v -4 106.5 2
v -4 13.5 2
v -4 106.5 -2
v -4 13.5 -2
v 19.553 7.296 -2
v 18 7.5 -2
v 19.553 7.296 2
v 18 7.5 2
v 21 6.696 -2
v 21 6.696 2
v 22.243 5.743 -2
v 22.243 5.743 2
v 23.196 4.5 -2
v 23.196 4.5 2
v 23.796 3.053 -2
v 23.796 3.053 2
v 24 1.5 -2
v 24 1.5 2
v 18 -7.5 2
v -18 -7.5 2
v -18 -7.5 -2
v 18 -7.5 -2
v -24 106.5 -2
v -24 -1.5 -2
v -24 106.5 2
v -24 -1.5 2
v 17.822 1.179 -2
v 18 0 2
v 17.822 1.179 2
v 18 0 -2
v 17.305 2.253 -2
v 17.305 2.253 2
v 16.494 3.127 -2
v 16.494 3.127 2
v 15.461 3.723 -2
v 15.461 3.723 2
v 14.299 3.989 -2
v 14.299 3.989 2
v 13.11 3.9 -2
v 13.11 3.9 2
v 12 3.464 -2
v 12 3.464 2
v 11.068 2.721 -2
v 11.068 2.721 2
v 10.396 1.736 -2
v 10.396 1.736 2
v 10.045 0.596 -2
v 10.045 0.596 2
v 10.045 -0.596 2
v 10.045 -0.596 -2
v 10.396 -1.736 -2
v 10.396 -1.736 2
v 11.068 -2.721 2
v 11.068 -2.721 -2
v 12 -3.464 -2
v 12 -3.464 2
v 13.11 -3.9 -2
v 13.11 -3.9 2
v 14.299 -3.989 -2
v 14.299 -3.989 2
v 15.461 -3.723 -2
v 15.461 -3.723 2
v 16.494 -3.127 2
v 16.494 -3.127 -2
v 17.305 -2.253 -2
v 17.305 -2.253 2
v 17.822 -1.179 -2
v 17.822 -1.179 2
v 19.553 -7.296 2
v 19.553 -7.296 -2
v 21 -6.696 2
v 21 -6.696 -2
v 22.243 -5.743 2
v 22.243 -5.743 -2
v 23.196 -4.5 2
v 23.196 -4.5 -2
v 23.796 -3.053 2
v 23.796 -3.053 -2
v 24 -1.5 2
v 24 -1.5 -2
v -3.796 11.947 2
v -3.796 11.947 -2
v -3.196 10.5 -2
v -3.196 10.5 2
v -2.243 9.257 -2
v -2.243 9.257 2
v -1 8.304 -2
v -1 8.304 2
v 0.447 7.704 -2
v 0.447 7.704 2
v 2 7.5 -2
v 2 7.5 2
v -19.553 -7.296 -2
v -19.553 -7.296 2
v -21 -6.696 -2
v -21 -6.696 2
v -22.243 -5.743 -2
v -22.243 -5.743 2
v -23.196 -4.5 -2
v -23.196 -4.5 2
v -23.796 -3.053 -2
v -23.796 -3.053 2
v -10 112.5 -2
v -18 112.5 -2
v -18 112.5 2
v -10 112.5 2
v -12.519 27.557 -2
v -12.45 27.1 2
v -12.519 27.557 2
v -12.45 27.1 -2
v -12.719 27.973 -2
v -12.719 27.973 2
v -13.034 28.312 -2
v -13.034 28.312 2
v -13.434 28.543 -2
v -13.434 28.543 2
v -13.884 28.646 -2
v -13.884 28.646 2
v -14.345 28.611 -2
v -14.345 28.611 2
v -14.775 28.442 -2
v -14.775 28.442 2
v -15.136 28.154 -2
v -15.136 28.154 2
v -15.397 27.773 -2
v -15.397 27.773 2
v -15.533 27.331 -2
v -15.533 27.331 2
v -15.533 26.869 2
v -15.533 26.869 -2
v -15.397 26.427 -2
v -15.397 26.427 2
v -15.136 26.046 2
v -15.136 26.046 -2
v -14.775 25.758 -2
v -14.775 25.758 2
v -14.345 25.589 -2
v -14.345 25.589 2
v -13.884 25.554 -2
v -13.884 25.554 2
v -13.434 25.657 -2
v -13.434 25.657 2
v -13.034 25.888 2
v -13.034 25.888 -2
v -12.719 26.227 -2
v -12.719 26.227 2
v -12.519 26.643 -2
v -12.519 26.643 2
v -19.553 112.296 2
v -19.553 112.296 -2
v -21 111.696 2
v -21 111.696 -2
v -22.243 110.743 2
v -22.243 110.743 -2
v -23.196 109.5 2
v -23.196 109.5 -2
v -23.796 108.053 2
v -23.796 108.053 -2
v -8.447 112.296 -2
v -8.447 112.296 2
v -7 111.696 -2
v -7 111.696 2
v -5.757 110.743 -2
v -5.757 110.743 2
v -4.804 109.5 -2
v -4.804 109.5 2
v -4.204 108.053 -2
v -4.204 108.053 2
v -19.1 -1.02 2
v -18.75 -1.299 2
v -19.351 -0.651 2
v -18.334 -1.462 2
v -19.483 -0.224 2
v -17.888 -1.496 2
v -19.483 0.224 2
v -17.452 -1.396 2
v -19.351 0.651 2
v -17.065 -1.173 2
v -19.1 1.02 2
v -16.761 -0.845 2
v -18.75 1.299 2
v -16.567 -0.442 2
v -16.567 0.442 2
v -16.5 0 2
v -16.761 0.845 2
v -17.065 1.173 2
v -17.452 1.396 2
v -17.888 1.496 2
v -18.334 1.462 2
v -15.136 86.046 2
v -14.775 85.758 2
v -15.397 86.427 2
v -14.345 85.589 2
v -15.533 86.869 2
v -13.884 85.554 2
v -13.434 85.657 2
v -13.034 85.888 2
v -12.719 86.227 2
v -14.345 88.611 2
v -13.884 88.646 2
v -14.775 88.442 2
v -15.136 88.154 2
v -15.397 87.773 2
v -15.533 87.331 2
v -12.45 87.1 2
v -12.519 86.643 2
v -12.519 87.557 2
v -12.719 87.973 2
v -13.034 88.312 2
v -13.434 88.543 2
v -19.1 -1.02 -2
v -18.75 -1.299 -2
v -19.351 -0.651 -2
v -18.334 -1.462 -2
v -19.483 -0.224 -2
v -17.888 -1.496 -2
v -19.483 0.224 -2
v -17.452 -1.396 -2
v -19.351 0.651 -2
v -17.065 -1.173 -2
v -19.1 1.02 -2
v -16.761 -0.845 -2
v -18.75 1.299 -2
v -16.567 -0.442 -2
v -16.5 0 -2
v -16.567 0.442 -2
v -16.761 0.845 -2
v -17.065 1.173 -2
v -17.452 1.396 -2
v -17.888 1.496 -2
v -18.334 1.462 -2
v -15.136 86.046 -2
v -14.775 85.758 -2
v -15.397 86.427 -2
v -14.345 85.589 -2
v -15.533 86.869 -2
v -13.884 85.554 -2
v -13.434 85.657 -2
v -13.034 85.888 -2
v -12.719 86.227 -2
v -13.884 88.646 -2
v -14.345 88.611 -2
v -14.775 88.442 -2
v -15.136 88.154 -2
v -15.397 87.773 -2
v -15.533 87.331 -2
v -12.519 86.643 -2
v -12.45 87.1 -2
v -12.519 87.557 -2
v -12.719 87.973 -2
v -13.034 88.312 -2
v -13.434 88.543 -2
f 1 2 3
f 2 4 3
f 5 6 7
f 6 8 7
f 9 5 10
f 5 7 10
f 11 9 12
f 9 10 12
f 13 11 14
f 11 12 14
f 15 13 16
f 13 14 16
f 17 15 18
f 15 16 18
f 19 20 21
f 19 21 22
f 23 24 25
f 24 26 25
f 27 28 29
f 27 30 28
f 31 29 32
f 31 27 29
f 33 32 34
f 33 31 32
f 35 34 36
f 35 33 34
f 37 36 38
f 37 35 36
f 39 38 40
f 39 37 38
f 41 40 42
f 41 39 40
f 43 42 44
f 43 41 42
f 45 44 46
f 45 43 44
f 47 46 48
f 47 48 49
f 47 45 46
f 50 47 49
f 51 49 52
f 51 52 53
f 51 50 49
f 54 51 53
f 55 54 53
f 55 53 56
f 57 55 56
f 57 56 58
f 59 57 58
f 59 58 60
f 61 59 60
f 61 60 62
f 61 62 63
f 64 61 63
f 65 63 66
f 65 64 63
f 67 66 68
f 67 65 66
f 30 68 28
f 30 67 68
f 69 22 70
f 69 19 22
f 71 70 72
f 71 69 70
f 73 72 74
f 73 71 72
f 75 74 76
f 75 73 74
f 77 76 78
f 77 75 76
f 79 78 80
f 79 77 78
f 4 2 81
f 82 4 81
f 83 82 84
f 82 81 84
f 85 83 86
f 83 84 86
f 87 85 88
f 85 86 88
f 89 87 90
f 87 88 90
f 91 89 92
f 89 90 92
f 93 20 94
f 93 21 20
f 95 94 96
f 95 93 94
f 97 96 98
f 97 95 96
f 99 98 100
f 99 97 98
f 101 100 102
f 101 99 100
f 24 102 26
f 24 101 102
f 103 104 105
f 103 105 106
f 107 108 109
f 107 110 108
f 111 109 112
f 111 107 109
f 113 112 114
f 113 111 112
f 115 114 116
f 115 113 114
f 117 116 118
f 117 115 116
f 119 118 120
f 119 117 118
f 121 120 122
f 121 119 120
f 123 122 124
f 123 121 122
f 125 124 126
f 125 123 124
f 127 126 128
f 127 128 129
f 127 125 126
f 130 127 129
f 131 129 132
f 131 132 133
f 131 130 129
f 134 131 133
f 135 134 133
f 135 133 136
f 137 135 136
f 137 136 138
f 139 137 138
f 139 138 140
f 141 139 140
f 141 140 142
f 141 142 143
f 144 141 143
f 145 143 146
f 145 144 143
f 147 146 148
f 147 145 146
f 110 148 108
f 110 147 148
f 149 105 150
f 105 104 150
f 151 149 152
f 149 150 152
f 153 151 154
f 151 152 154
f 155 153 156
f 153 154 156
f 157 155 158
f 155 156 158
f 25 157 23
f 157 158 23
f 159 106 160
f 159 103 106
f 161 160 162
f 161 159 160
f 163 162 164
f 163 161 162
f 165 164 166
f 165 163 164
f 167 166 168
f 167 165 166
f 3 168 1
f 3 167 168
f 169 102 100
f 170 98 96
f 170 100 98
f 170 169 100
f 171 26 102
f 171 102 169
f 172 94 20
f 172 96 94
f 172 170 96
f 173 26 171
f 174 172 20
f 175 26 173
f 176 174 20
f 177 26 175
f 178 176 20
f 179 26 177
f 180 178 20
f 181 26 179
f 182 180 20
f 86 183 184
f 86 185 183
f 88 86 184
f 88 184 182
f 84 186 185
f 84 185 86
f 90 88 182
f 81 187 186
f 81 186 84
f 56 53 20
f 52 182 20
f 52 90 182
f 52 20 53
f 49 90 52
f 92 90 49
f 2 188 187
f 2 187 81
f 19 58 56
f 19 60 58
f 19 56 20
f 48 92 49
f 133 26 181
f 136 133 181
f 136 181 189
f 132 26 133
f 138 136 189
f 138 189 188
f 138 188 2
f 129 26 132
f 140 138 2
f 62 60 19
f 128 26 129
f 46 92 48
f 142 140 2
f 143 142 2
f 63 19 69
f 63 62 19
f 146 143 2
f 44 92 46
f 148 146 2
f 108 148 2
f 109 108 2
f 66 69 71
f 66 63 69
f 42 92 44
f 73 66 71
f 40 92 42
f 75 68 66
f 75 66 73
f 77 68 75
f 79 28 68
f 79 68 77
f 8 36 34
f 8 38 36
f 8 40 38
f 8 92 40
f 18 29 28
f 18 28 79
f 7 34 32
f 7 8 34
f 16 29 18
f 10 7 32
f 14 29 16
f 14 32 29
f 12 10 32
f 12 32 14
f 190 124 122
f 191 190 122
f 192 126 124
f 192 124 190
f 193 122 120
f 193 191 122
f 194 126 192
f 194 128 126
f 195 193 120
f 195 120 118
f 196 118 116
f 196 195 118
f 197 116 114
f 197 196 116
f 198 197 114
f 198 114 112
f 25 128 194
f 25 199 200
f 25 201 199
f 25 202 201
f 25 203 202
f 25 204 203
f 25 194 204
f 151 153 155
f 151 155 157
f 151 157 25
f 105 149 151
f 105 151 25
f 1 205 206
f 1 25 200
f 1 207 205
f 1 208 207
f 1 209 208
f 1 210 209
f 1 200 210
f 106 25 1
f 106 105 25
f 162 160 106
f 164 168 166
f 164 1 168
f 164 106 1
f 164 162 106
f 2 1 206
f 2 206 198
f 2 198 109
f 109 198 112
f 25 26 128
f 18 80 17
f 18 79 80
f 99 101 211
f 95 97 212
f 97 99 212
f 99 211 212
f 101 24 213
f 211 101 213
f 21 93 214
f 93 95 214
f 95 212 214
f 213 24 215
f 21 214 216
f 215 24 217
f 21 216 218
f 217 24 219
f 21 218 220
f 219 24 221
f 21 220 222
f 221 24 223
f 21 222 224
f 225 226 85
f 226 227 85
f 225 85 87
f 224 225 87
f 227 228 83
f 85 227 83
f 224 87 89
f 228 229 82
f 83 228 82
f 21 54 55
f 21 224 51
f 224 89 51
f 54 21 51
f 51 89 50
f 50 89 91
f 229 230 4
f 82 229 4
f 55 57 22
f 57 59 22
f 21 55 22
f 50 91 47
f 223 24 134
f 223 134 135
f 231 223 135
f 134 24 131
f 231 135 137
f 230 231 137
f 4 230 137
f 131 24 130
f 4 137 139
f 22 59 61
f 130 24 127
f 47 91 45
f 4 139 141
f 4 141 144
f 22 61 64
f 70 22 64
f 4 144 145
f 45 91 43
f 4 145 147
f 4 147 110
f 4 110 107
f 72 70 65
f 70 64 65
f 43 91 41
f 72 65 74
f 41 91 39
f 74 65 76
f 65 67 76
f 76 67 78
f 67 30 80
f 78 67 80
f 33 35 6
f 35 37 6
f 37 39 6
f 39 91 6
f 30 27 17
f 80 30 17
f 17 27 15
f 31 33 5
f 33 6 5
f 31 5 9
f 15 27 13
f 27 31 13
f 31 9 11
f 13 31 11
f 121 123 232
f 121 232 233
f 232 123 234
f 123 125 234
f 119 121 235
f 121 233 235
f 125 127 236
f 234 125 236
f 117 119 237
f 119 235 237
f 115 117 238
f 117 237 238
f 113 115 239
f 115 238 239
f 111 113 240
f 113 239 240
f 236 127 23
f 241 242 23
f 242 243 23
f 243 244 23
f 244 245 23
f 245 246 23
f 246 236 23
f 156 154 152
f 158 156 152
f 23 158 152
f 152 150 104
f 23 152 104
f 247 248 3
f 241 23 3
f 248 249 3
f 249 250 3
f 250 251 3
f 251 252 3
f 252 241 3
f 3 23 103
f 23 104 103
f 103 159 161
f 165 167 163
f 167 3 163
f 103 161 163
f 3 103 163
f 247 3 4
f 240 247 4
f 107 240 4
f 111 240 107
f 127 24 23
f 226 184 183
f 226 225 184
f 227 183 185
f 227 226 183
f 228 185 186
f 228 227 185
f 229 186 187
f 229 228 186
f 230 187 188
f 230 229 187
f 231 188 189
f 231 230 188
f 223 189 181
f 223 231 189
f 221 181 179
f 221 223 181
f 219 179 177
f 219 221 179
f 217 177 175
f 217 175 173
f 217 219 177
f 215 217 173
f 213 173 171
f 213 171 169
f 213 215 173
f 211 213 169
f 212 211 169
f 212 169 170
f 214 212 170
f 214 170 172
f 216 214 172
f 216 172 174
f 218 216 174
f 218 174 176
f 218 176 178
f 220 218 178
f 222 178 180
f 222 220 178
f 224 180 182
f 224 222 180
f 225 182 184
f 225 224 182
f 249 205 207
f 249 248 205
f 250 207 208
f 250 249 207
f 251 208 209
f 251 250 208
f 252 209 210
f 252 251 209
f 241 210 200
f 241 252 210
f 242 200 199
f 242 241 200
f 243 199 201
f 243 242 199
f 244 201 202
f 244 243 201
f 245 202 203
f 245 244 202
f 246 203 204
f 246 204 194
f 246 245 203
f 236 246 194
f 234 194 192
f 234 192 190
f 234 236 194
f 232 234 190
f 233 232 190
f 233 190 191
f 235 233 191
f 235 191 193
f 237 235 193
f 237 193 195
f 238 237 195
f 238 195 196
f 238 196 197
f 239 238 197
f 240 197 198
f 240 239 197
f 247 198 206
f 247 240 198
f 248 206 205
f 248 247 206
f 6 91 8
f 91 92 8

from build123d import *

# Parameters (mm, degrees)
SKETCH1_W           = 20
SKETCH1_H           = 105
SKETCH1_R           = 1.55
SKETCH1_H_2         = 15
SKETCH1_R_2         = 1.5
SKETCH1_W_2         = 28
SKETCH1_R_3         = 4
BOSS_EXTRUDE1_DEPTH = 2
FILLET1_R           = 6


with BuildPart() as part:
    # Sketch1 → Boss-Extrude1 (new, symmetric)
    # profile 1 of 3: a face of its own
    with BuildSketch(Plane.XY):
        with Locations((-14, 60)):
            Rectangle(SKETCH1_W, SKETCH1_H)
        with Locations((-14, 27.1)):
            Circle(SKETCH1_R, mode=Mode.SUBTRACT)
        with Locations((-14, 87.1)):
            Circle(SKETCH1_R, mode=Mode.SUBTRACT)
    # profile 2 of 3: a face of its own
    with BuildSketch(Plane.XY):
        with Locations((-14, 0)):
            Rectangle(SKETCH1_W, SKETCH1_H_2)
        with Locations((-18, 0)):
            Circle(SKETCH1_R_2, mode=Mode.SUBTRACT)
    # profile 3 of 3: a face of its own
    with BuildSketch(Plane.XY):
        with Locations((10, 0)):
            Rectangle(SKETCH1_W_2, SKETCH1_H_2)
        with Locations((14, 0)):
            Circle(SKETCH1_R_3, mode=Mode.SUBTRACT)
    extrude(amount=BOSS_EXTRUDE1_DEPTH, both=True)

    # Fillet1
    fillet1_edges = [part.edges().sort_by_distance(p)[0] for p in [
        (-24, 112.5, 0),
        (-4, 112.5, 0),
        (-4, 7.5, 0),
        (24, 7.5, 0),
        (24, -7.5, 0),
        (-24, -7.5, 0),
    ]]
    fillet(fillet1_edges, radius=FILLET1_R)


solid = part.part
